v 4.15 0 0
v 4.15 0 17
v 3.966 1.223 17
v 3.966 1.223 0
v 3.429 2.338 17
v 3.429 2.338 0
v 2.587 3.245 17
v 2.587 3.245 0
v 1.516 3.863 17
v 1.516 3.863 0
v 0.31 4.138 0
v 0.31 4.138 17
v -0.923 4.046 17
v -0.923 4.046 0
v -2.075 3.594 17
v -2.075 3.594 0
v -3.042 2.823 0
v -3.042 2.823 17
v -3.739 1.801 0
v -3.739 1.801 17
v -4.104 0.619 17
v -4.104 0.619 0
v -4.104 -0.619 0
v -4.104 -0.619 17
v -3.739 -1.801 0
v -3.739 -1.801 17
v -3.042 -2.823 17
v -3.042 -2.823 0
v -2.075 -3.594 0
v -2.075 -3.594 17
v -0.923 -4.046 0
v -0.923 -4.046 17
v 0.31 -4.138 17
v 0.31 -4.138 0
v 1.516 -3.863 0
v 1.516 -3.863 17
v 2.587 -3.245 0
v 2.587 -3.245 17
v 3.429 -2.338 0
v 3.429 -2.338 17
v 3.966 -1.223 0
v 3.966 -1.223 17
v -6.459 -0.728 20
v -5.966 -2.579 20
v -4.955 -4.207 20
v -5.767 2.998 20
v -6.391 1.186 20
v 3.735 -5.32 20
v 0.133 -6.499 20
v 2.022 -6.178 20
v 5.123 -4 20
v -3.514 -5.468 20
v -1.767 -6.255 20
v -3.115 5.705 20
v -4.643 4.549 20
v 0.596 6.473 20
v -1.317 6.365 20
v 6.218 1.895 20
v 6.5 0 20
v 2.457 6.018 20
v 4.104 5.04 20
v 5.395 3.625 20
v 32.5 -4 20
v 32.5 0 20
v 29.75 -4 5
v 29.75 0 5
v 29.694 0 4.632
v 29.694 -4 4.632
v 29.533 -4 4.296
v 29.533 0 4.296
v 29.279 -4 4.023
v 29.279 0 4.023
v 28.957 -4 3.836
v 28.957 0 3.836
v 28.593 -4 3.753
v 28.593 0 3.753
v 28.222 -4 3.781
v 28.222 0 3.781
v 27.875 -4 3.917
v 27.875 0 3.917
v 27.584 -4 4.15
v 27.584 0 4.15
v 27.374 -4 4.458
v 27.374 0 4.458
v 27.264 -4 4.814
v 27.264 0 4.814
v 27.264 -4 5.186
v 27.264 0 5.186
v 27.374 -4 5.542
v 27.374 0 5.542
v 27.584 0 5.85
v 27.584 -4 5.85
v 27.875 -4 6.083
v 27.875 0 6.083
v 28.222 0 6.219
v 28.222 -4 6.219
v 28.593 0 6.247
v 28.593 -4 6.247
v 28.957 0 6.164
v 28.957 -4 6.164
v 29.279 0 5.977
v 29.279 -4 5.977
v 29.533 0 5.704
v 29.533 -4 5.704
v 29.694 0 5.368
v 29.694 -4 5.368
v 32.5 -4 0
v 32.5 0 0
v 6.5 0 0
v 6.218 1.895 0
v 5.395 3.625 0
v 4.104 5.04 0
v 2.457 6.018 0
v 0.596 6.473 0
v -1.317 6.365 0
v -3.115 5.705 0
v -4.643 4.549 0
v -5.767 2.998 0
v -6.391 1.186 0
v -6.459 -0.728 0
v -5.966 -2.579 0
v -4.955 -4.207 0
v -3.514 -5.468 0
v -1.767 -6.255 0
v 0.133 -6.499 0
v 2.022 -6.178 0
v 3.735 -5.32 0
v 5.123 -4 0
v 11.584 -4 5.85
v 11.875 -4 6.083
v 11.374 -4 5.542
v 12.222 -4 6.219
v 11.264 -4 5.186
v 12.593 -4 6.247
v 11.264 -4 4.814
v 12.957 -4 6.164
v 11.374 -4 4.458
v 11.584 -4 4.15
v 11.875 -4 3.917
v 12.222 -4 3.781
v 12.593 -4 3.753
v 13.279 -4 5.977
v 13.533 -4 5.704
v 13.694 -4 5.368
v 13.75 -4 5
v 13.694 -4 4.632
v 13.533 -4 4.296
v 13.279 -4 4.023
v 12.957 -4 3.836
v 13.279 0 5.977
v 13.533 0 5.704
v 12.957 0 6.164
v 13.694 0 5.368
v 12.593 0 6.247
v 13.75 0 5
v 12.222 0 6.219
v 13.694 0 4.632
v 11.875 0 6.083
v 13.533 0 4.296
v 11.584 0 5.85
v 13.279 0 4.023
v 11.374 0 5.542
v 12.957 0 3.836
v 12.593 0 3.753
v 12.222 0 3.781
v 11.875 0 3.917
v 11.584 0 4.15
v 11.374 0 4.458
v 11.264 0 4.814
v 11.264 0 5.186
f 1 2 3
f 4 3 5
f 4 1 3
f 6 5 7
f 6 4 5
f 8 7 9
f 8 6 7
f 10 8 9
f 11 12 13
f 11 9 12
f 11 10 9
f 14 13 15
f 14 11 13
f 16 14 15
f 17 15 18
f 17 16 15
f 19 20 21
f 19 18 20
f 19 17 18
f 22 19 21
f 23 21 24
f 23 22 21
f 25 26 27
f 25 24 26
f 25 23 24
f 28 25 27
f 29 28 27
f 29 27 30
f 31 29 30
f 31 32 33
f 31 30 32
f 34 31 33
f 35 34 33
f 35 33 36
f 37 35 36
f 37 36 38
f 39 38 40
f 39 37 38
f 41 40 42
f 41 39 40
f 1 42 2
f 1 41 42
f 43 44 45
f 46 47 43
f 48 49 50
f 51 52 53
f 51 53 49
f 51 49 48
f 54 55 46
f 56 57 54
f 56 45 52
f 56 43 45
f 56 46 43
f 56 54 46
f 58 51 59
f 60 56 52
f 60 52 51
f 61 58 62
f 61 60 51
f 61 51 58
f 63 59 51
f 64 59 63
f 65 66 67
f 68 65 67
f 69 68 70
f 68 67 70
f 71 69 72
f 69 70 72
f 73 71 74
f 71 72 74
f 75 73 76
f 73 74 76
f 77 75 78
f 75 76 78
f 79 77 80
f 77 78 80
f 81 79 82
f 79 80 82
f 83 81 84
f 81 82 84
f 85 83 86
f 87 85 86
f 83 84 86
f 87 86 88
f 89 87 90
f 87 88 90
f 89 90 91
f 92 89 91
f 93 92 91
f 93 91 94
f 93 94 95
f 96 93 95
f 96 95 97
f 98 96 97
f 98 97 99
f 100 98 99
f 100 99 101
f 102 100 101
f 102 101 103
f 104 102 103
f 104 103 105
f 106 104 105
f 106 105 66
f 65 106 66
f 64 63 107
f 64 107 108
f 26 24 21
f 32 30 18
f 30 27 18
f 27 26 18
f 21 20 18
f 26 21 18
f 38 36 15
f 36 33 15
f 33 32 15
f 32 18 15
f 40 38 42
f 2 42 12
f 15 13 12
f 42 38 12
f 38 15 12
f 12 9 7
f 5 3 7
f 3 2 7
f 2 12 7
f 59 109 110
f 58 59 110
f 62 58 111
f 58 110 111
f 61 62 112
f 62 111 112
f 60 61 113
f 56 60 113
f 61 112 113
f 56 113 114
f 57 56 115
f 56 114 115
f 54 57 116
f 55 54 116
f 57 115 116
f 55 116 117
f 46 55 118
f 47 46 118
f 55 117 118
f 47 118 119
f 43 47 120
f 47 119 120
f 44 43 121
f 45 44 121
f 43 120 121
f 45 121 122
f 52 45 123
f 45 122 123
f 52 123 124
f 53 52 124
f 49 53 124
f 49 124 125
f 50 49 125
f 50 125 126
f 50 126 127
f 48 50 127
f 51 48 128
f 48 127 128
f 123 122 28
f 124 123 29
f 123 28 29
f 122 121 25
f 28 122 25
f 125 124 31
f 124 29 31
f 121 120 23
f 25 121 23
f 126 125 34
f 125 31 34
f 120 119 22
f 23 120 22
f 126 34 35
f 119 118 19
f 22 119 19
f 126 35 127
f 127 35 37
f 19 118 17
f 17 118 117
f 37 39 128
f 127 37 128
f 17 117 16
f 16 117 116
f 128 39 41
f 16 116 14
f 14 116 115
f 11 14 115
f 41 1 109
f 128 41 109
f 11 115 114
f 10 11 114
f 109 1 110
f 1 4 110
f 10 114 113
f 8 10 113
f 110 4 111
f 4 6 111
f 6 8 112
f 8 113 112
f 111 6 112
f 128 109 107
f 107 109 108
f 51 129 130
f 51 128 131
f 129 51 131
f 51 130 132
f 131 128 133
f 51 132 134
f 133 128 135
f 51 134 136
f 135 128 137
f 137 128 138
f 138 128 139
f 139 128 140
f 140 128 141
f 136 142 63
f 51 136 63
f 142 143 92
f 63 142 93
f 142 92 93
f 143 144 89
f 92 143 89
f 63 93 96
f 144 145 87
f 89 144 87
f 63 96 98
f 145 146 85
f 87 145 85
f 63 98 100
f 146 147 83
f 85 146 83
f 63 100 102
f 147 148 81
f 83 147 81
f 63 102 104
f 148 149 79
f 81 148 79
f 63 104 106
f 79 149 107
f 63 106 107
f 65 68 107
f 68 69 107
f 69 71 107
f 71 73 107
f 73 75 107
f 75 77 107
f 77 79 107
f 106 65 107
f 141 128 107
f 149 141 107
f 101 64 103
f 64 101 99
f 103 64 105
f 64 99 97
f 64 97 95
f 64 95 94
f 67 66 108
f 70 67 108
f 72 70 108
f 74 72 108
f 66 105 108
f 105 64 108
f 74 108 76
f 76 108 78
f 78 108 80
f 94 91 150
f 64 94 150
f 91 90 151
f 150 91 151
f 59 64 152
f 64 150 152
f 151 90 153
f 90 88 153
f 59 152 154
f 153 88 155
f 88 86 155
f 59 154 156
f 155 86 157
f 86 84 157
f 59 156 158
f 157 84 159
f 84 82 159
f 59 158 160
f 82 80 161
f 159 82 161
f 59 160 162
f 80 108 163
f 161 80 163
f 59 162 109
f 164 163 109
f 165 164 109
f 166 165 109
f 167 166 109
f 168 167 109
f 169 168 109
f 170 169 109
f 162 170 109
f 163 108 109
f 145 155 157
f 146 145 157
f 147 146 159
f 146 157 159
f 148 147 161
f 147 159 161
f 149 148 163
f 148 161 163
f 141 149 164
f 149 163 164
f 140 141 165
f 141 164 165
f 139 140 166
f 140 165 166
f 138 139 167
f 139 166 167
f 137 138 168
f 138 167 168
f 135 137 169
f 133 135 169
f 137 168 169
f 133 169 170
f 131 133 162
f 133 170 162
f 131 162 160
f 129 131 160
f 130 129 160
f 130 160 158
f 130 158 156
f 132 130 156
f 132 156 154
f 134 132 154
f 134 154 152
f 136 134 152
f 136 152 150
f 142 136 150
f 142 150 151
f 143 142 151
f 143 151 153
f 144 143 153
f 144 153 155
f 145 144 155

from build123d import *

# Parameters (mm, degrees)
SKETCH_1_R          = 4.15
EXTRUDE_1_DEPTH     = 20
SKETCH_2_R          = 4.923200542
EXTRUDE_2_DEPTH     = 3
SKETCH_3_R          = 1.25
CUT_EXTRUDE_1_DEPTH = 13


with BuildPart() as part:
    # Эскиз1 → Бобышка-Вытянуть1 (new body)
    with BuildSketch(Plane.XY):
        with BuildLine():
            Line((5.123475383, -4), (32.5, -4))
            Line((32.5, -4), (32.5, 0))
            Line((32.5, 0), (6.5, 0))
            ThreePointArc((6.5, 0), (-6.146242348, 2.115113473), (5.123475383, -4))
        make_face()
        Circle(SKETCH_1_R, mode=Mode.SUBTRACT)
    extrude(amount=EXTRUDE_1_DEPTH)

    # Эскиз2 → Бобышка-Вытянуть2 (add)
    with BuildSketch(Plane.XY.offset(20)):
        Circle(SKETCH_2_R)
    extrude(amount=-EXTRUDE_2_DEPTH)

    # Эскиз3 → Вырез-Вытянуть1 (cut)
    with BuildSketch(Plane(origin=(0, 0, 0), x_dir=(1, 0, 0), z_dir=(0, 1, 0))):
        with Locations((12.5, -5)):
            Circle(SKETCH_3_R)
        with Locations((28.5, -5)):
            Circle(SKETCH_3_R)
    extrude(amount=-CUT_EXTRUDE_1_DEPTH, mode=Mode.SUBTRACT)


solid = part.part
